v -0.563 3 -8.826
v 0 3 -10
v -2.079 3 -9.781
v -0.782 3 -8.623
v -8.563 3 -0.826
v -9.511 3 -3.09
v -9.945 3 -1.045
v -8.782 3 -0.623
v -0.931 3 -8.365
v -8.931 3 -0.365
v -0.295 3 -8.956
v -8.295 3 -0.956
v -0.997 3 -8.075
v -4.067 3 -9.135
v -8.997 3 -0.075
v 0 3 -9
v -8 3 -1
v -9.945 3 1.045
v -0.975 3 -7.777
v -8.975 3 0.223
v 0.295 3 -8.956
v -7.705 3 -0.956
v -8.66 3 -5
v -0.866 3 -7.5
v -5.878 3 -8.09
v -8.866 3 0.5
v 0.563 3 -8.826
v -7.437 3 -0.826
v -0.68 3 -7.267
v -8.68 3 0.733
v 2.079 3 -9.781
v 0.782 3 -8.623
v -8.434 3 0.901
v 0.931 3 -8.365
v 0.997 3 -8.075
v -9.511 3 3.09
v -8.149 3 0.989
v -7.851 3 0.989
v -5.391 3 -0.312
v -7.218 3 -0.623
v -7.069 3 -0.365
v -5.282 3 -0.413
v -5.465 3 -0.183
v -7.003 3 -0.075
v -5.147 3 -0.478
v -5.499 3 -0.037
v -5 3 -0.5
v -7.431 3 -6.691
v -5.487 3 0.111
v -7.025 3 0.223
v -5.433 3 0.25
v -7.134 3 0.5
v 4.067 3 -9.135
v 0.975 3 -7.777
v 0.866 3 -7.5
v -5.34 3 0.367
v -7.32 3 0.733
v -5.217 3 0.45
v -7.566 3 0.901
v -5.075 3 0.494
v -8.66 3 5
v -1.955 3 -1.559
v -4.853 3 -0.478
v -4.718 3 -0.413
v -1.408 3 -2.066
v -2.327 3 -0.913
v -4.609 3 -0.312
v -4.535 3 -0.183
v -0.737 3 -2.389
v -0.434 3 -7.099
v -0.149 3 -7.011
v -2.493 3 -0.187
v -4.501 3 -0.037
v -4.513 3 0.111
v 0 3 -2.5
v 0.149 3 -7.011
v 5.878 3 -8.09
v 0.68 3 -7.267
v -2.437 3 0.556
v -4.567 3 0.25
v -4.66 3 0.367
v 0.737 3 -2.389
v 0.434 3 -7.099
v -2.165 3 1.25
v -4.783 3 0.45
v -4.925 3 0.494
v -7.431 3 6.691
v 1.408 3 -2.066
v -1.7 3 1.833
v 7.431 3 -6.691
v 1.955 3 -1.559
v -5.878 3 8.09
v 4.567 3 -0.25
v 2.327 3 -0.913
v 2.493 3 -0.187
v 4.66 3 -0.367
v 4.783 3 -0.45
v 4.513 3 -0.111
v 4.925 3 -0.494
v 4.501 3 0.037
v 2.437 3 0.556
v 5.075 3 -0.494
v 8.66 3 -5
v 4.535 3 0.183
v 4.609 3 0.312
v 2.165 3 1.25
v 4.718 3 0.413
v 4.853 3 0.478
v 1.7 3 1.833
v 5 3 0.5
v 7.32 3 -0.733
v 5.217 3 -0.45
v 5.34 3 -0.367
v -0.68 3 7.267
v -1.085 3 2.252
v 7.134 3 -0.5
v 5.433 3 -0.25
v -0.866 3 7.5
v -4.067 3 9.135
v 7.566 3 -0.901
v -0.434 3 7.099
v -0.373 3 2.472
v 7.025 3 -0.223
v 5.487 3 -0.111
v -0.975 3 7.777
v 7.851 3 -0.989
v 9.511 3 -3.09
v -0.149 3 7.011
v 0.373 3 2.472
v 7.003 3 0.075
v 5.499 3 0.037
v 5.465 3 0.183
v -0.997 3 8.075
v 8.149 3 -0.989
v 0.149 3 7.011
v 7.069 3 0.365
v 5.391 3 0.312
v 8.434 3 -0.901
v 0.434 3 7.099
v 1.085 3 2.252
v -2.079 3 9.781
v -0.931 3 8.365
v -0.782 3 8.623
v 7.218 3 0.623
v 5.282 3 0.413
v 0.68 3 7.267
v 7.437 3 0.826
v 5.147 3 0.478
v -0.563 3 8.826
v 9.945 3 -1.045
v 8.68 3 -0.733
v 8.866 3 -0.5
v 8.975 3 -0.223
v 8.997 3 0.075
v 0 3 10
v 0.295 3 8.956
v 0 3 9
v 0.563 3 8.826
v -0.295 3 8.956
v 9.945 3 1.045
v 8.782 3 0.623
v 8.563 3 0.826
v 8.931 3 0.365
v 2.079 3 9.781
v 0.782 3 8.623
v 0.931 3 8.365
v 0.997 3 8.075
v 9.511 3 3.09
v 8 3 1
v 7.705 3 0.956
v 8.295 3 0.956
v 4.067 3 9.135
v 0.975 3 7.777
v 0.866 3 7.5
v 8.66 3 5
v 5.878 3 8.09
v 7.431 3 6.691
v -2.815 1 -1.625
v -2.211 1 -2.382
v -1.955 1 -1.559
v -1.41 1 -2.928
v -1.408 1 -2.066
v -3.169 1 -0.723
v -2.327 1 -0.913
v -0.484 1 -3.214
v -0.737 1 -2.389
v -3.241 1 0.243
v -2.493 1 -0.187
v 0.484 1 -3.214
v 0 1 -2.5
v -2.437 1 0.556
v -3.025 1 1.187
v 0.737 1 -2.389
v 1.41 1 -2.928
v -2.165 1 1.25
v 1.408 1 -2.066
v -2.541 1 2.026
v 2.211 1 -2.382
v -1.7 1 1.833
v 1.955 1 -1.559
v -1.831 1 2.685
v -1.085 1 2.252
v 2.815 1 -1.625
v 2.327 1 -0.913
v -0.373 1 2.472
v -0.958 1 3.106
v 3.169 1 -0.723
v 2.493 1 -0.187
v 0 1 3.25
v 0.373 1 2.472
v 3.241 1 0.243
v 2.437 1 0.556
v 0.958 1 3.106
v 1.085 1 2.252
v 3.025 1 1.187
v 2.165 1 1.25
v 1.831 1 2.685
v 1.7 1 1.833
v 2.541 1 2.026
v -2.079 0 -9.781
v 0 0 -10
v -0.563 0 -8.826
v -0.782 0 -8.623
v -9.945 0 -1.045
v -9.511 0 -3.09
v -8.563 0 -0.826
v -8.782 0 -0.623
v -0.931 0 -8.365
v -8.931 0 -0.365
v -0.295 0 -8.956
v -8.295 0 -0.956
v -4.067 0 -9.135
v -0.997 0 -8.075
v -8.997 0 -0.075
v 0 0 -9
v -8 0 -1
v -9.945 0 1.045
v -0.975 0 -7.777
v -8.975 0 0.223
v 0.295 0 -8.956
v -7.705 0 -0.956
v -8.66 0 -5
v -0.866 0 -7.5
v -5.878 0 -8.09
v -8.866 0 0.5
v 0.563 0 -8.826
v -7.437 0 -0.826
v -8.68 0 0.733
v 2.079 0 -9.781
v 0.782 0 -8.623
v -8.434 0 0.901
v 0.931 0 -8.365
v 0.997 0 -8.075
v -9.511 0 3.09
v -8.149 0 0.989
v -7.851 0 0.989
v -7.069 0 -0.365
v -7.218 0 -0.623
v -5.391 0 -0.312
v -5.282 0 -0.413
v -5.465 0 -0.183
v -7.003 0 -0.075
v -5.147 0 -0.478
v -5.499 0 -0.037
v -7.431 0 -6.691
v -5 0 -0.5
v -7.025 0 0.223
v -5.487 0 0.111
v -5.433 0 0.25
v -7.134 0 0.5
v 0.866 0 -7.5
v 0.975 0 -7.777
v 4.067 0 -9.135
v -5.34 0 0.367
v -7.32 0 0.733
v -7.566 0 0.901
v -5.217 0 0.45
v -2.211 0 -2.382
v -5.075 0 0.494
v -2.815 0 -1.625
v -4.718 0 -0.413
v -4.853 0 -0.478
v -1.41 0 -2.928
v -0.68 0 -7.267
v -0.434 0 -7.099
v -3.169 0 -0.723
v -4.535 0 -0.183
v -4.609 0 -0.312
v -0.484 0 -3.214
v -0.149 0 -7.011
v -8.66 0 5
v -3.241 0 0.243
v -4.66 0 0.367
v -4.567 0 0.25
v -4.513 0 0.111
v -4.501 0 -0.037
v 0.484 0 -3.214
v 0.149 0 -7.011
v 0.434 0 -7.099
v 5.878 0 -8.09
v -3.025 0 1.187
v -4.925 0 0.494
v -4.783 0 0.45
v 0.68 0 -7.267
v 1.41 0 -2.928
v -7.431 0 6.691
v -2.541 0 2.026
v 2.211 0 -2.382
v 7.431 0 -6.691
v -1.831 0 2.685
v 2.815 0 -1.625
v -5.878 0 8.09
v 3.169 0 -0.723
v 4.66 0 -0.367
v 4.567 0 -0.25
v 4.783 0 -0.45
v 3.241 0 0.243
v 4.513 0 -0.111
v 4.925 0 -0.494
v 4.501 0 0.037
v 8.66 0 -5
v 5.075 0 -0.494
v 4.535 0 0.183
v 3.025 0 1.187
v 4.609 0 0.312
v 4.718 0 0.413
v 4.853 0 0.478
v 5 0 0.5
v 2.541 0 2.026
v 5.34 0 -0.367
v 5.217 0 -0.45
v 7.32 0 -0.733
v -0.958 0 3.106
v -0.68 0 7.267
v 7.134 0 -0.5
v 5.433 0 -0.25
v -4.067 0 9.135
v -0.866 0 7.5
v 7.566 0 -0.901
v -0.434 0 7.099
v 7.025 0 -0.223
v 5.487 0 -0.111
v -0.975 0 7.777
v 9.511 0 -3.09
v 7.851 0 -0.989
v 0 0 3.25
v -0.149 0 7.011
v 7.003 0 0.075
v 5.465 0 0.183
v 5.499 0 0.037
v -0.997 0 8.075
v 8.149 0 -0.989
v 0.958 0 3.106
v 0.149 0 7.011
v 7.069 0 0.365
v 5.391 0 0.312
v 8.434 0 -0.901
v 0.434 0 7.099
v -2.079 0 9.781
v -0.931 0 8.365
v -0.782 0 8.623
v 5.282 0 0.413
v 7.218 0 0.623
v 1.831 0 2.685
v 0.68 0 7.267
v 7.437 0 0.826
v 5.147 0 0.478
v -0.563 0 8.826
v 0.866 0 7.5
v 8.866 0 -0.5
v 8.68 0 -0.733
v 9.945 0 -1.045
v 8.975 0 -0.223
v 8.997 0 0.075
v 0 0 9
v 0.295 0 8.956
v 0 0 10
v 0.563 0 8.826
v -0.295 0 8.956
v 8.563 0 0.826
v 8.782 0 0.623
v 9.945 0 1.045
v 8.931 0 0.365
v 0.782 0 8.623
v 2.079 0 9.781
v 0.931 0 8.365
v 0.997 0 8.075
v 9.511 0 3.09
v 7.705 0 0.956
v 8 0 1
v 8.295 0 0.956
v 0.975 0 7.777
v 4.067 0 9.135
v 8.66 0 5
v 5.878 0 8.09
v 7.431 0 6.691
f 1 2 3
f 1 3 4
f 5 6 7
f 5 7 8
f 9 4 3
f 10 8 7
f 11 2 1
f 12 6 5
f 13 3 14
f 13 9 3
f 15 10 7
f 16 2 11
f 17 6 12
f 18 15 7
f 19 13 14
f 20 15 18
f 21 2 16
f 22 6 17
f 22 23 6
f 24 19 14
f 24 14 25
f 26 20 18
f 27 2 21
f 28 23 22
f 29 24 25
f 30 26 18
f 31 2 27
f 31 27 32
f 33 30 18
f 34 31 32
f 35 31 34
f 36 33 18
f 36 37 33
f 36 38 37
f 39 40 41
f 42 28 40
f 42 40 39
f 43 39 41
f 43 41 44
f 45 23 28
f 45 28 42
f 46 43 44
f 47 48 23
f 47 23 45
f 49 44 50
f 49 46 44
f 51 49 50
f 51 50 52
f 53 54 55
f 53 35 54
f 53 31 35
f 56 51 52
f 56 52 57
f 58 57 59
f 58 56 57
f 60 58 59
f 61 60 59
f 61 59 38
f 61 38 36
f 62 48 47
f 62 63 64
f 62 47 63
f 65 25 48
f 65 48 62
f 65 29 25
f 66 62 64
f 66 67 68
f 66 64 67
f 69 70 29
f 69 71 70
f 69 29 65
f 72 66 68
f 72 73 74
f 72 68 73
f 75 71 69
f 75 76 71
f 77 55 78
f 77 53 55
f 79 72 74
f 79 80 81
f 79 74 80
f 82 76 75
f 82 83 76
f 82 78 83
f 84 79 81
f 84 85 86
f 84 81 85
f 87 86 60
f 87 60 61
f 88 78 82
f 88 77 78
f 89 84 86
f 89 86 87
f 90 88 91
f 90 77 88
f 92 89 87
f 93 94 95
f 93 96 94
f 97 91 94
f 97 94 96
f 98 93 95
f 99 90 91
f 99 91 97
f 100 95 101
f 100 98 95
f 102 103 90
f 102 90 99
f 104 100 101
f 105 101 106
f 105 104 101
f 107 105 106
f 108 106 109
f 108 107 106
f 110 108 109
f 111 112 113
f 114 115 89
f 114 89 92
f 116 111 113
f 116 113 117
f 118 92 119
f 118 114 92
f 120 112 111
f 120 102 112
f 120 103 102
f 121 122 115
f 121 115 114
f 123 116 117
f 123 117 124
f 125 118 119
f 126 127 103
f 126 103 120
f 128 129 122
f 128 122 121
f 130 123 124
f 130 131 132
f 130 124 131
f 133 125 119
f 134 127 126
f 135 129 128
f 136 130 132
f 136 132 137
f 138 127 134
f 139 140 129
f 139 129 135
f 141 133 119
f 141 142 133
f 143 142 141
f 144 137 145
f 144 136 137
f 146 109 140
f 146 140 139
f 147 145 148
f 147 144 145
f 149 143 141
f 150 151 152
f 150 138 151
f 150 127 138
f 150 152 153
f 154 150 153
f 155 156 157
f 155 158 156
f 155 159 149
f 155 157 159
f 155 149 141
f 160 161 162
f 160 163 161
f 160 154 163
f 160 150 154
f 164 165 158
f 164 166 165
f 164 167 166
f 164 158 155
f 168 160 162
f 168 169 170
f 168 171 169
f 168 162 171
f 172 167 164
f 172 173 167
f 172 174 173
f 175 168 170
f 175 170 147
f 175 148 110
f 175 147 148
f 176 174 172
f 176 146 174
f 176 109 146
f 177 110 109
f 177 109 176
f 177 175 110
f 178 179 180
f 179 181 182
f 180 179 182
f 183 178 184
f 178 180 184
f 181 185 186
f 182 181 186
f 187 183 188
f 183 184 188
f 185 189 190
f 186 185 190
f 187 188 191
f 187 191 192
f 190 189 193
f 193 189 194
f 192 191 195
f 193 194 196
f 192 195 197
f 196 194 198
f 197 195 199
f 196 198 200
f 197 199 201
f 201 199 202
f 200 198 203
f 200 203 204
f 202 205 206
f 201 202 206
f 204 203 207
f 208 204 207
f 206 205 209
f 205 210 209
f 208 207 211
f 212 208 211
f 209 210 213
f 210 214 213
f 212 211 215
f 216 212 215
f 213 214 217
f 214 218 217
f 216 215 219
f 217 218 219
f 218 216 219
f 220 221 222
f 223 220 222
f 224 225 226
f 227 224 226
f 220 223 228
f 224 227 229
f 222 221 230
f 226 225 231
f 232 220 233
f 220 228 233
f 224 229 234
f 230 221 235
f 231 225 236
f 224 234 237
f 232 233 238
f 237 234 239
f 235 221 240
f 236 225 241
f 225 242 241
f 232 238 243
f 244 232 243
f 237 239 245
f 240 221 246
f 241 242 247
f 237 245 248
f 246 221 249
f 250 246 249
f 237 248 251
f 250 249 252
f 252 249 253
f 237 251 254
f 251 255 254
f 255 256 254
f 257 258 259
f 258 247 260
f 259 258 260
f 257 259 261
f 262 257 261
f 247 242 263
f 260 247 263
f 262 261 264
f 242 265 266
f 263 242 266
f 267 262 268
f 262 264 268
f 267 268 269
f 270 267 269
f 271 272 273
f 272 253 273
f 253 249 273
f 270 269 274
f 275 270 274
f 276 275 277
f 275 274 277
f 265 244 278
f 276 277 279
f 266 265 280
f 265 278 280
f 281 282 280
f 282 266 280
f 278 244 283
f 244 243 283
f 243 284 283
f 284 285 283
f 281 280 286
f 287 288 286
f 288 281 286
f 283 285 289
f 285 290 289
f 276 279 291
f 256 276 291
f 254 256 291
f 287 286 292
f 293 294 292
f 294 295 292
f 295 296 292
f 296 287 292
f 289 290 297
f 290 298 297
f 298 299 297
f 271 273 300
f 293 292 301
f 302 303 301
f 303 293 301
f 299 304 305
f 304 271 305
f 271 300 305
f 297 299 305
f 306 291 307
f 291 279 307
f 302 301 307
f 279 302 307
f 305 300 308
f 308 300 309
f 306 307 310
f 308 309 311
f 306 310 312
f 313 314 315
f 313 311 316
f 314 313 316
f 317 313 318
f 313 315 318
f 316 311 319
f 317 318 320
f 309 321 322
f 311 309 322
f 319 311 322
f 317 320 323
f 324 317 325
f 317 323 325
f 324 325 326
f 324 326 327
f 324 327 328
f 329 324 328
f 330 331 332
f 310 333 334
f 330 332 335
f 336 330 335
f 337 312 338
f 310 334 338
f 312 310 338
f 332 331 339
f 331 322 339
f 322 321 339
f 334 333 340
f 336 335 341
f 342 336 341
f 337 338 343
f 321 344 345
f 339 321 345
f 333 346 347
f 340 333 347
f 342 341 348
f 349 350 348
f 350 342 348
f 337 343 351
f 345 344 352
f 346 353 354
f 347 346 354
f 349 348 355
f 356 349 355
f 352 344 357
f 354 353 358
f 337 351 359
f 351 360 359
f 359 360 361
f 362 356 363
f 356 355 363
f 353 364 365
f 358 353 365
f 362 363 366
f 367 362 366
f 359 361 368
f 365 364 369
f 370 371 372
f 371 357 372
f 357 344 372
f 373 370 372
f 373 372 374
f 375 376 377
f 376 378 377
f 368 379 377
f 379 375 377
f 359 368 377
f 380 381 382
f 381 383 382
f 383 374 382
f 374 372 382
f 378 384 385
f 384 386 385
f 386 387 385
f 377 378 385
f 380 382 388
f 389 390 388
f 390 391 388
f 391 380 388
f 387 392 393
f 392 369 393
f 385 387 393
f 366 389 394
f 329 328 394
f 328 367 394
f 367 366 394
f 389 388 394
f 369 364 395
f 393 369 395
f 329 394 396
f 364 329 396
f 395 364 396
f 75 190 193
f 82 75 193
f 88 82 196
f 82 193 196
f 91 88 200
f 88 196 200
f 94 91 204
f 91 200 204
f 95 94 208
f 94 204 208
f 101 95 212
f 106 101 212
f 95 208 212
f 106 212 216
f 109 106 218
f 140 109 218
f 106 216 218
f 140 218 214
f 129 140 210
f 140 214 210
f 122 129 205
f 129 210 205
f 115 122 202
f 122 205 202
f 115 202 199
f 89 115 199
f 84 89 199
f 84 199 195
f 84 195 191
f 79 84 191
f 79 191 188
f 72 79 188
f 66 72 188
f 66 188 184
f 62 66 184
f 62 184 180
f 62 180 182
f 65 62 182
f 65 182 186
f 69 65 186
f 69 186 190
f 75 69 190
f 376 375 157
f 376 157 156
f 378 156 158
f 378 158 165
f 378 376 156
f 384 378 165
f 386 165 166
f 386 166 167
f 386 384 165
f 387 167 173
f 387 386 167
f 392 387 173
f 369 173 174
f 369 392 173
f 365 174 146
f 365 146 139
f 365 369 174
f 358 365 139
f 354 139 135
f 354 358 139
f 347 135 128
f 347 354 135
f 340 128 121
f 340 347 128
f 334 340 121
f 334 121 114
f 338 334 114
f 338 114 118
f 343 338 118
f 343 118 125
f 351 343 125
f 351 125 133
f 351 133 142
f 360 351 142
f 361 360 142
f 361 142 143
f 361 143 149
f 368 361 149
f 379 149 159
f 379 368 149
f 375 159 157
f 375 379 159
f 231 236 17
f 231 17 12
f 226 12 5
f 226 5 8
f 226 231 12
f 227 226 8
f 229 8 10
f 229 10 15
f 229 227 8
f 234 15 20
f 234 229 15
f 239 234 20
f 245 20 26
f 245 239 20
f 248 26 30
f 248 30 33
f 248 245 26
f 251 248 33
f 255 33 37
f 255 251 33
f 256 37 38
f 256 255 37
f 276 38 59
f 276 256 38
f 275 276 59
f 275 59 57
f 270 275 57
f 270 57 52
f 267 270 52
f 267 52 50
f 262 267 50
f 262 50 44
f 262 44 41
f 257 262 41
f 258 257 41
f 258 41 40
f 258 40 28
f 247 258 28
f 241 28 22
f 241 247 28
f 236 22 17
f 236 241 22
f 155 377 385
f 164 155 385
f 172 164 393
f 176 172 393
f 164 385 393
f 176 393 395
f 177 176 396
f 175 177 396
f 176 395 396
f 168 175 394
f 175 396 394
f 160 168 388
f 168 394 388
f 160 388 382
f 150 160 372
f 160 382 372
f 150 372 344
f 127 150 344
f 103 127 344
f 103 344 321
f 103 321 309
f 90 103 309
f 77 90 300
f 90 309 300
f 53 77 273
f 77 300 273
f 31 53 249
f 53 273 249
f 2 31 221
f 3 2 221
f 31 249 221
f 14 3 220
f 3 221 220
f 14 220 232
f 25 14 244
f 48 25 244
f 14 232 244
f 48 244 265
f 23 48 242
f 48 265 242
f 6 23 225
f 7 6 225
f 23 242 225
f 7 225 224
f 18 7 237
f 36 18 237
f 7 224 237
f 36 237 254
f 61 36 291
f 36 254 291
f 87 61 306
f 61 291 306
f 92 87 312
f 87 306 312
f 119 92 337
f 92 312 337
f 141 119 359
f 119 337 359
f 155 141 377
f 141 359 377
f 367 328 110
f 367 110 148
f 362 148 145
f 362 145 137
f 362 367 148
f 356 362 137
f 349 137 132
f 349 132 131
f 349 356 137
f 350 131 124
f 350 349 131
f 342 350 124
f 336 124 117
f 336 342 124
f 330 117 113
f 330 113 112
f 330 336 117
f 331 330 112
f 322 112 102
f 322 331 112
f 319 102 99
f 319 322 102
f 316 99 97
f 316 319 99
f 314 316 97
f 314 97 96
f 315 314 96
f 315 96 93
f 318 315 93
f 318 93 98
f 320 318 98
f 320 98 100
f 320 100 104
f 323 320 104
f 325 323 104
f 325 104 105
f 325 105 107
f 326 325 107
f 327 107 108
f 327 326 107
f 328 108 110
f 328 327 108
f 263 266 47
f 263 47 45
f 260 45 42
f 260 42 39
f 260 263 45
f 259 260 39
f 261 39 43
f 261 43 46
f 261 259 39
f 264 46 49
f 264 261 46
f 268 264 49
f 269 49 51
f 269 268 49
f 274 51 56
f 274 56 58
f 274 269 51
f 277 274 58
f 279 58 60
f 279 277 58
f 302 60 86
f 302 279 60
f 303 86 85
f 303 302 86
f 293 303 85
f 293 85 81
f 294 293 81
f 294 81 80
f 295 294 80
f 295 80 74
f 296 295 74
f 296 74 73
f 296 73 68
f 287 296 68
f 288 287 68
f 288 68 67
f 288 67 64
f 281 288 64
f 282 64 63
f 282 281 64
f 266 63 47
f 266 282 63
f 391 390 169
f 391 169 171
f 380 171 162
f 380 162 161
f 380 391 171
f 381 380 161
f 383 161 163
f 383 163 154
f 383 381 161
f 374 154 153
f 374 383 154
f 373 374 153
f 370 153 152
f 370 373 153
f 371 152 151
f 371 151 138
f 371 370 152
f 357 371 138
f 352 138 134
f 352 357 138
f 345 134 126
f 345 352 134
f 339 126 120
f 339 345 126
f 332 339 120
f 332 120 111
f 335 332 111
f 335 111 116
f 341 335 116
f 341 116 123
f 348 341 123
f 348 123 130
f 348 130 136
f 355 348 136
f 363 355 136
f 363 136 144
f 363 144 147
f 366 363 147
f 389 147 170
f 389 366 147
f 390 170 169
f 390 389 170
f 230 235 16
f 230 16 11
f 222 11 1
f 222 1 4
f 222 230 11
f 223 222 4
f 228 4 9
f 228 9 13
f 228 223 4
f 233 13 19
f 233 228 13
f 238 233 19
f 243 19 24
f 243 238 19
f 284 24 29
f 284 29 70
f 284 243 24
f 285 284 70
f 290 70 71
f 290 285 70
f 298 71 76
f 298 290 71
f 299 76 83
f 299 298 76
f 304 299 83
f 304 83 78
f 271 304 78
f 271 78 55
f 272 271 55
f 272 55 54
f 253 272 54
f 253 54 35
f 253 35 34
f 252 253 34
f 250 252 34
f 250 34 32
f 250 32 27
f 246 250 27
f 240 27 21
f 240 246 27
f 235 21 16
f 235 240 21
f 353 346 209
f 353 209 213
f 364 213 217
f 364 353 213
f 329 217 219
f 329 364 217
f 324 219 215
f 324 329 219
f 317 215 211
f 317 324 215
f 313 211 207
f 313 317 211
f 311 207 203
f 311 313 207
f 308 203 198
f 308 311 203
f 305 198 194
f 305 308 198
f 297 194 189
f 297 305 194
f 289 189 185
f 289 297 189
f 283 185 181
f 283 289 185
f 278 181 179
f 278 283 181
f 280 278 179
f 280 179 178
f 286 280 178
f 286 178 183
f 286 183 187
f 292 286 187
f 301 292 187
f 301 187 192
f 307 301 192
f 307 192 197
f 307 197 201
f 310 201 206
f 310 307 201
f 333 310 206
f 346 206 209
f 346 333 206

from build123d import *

# Parameters (mm, degrees)
SKETCH_1_R          = 10
EXTRUDE_1_DEPTH     = 3
SKETCH_2_R          = 1
SKETCH_2_R_2        = 0.5
CUT_EXTRUDE_1_DEPTH = 3
SKETCH_4_R          = 3.25
CUT_EXTRUDE_5_DEPTH = 1
CUT_EXTRUDE_6_REACH = 16.283
SKETCH_5_R          = 2.5


with BuildPart() as part:
    # 草图1 → 凸台-拉伸1 (new body)
    with BuildSketch(Plane(origin=(0, 0, 0), x_dir=(1, 0, 0), z_dir=(0, 1, 0))):
        with Locations(Location((0, 0, 0), (0, 0, 270))):
            Circle(SKETCH_1_R)
    extrude(amount=EXTRUDE_1_DEPTH)

    # 草图2 → 切除-拉伸1 (cut)
    with BuildSketch(Plane(origin=(0, 0, 0), x_dir=(1, 0, 0), z_dir=(0, 1, 0))):
        with Locations(Location((8, 0, 0), (0, 0, 270))):
            Circle(SKETCH_2_R)
        with Locations(Location((5, 0, 0), (0, 0, 270))):
            Circle(SKETCH_2_R_2)
        with Locations(Location((-5, 0, 0), (0, 0, 90))):
            Circle(SKETCH_2_R_2)
        with Locations(Location((-8, 0, 0), (0, 0, 90))):
            Circle(SKETCH_2_R)
        with Locations(Location((0, 8, 0), (0, 0, 90))):
            Circle(SKETCH_2_R)
        with Locations(Location((0, -8, 0), (0, 0, 270))):
            Circle(SKETCH_2_R)
    extrude(amount=CUT_EXTRUDE_1_DEPTH, mode=Mode.SUBTRACT)

    # 草图4 → 切除-拉伸5 (cut)
    with BuildSketch(Plane(origin=(0, 0, 0), x_dir=(1, 0, 0), z_dir=(0, 1, 0))):
        with Locations(Location((0, 0, 0), (0, 0, 270))):
            Circle(SKETCH_4_R)
    extrude(amount=CUT_EXTRUDE_5_DEPTH, mode=Mode.SUBTRACT)

    # 草图5 → 切除-拉伸6 (cut, up to next)
    with BuildSketch(Plane.XZ.offset(-1), mode=Mode.PRIVATE) as cut_extrude_6_sk1:
        with Locations(Location((0, 0, 0), (0, 0, 270))):
            Circle(SKETCH_5_R)
    cut_extrude_6_tool1 = extrude(cut_extrude_6_sk1.sketch, amount=-CUT_EXTRUDE_6_REACH, mode=Mode.PRIVATE) & part.part
    add(cut_extrude_6_tool1.solids().sort_by_distance((0, 1, 0))[0], mode=Mode.SUBTRACT)


solid = part.part
